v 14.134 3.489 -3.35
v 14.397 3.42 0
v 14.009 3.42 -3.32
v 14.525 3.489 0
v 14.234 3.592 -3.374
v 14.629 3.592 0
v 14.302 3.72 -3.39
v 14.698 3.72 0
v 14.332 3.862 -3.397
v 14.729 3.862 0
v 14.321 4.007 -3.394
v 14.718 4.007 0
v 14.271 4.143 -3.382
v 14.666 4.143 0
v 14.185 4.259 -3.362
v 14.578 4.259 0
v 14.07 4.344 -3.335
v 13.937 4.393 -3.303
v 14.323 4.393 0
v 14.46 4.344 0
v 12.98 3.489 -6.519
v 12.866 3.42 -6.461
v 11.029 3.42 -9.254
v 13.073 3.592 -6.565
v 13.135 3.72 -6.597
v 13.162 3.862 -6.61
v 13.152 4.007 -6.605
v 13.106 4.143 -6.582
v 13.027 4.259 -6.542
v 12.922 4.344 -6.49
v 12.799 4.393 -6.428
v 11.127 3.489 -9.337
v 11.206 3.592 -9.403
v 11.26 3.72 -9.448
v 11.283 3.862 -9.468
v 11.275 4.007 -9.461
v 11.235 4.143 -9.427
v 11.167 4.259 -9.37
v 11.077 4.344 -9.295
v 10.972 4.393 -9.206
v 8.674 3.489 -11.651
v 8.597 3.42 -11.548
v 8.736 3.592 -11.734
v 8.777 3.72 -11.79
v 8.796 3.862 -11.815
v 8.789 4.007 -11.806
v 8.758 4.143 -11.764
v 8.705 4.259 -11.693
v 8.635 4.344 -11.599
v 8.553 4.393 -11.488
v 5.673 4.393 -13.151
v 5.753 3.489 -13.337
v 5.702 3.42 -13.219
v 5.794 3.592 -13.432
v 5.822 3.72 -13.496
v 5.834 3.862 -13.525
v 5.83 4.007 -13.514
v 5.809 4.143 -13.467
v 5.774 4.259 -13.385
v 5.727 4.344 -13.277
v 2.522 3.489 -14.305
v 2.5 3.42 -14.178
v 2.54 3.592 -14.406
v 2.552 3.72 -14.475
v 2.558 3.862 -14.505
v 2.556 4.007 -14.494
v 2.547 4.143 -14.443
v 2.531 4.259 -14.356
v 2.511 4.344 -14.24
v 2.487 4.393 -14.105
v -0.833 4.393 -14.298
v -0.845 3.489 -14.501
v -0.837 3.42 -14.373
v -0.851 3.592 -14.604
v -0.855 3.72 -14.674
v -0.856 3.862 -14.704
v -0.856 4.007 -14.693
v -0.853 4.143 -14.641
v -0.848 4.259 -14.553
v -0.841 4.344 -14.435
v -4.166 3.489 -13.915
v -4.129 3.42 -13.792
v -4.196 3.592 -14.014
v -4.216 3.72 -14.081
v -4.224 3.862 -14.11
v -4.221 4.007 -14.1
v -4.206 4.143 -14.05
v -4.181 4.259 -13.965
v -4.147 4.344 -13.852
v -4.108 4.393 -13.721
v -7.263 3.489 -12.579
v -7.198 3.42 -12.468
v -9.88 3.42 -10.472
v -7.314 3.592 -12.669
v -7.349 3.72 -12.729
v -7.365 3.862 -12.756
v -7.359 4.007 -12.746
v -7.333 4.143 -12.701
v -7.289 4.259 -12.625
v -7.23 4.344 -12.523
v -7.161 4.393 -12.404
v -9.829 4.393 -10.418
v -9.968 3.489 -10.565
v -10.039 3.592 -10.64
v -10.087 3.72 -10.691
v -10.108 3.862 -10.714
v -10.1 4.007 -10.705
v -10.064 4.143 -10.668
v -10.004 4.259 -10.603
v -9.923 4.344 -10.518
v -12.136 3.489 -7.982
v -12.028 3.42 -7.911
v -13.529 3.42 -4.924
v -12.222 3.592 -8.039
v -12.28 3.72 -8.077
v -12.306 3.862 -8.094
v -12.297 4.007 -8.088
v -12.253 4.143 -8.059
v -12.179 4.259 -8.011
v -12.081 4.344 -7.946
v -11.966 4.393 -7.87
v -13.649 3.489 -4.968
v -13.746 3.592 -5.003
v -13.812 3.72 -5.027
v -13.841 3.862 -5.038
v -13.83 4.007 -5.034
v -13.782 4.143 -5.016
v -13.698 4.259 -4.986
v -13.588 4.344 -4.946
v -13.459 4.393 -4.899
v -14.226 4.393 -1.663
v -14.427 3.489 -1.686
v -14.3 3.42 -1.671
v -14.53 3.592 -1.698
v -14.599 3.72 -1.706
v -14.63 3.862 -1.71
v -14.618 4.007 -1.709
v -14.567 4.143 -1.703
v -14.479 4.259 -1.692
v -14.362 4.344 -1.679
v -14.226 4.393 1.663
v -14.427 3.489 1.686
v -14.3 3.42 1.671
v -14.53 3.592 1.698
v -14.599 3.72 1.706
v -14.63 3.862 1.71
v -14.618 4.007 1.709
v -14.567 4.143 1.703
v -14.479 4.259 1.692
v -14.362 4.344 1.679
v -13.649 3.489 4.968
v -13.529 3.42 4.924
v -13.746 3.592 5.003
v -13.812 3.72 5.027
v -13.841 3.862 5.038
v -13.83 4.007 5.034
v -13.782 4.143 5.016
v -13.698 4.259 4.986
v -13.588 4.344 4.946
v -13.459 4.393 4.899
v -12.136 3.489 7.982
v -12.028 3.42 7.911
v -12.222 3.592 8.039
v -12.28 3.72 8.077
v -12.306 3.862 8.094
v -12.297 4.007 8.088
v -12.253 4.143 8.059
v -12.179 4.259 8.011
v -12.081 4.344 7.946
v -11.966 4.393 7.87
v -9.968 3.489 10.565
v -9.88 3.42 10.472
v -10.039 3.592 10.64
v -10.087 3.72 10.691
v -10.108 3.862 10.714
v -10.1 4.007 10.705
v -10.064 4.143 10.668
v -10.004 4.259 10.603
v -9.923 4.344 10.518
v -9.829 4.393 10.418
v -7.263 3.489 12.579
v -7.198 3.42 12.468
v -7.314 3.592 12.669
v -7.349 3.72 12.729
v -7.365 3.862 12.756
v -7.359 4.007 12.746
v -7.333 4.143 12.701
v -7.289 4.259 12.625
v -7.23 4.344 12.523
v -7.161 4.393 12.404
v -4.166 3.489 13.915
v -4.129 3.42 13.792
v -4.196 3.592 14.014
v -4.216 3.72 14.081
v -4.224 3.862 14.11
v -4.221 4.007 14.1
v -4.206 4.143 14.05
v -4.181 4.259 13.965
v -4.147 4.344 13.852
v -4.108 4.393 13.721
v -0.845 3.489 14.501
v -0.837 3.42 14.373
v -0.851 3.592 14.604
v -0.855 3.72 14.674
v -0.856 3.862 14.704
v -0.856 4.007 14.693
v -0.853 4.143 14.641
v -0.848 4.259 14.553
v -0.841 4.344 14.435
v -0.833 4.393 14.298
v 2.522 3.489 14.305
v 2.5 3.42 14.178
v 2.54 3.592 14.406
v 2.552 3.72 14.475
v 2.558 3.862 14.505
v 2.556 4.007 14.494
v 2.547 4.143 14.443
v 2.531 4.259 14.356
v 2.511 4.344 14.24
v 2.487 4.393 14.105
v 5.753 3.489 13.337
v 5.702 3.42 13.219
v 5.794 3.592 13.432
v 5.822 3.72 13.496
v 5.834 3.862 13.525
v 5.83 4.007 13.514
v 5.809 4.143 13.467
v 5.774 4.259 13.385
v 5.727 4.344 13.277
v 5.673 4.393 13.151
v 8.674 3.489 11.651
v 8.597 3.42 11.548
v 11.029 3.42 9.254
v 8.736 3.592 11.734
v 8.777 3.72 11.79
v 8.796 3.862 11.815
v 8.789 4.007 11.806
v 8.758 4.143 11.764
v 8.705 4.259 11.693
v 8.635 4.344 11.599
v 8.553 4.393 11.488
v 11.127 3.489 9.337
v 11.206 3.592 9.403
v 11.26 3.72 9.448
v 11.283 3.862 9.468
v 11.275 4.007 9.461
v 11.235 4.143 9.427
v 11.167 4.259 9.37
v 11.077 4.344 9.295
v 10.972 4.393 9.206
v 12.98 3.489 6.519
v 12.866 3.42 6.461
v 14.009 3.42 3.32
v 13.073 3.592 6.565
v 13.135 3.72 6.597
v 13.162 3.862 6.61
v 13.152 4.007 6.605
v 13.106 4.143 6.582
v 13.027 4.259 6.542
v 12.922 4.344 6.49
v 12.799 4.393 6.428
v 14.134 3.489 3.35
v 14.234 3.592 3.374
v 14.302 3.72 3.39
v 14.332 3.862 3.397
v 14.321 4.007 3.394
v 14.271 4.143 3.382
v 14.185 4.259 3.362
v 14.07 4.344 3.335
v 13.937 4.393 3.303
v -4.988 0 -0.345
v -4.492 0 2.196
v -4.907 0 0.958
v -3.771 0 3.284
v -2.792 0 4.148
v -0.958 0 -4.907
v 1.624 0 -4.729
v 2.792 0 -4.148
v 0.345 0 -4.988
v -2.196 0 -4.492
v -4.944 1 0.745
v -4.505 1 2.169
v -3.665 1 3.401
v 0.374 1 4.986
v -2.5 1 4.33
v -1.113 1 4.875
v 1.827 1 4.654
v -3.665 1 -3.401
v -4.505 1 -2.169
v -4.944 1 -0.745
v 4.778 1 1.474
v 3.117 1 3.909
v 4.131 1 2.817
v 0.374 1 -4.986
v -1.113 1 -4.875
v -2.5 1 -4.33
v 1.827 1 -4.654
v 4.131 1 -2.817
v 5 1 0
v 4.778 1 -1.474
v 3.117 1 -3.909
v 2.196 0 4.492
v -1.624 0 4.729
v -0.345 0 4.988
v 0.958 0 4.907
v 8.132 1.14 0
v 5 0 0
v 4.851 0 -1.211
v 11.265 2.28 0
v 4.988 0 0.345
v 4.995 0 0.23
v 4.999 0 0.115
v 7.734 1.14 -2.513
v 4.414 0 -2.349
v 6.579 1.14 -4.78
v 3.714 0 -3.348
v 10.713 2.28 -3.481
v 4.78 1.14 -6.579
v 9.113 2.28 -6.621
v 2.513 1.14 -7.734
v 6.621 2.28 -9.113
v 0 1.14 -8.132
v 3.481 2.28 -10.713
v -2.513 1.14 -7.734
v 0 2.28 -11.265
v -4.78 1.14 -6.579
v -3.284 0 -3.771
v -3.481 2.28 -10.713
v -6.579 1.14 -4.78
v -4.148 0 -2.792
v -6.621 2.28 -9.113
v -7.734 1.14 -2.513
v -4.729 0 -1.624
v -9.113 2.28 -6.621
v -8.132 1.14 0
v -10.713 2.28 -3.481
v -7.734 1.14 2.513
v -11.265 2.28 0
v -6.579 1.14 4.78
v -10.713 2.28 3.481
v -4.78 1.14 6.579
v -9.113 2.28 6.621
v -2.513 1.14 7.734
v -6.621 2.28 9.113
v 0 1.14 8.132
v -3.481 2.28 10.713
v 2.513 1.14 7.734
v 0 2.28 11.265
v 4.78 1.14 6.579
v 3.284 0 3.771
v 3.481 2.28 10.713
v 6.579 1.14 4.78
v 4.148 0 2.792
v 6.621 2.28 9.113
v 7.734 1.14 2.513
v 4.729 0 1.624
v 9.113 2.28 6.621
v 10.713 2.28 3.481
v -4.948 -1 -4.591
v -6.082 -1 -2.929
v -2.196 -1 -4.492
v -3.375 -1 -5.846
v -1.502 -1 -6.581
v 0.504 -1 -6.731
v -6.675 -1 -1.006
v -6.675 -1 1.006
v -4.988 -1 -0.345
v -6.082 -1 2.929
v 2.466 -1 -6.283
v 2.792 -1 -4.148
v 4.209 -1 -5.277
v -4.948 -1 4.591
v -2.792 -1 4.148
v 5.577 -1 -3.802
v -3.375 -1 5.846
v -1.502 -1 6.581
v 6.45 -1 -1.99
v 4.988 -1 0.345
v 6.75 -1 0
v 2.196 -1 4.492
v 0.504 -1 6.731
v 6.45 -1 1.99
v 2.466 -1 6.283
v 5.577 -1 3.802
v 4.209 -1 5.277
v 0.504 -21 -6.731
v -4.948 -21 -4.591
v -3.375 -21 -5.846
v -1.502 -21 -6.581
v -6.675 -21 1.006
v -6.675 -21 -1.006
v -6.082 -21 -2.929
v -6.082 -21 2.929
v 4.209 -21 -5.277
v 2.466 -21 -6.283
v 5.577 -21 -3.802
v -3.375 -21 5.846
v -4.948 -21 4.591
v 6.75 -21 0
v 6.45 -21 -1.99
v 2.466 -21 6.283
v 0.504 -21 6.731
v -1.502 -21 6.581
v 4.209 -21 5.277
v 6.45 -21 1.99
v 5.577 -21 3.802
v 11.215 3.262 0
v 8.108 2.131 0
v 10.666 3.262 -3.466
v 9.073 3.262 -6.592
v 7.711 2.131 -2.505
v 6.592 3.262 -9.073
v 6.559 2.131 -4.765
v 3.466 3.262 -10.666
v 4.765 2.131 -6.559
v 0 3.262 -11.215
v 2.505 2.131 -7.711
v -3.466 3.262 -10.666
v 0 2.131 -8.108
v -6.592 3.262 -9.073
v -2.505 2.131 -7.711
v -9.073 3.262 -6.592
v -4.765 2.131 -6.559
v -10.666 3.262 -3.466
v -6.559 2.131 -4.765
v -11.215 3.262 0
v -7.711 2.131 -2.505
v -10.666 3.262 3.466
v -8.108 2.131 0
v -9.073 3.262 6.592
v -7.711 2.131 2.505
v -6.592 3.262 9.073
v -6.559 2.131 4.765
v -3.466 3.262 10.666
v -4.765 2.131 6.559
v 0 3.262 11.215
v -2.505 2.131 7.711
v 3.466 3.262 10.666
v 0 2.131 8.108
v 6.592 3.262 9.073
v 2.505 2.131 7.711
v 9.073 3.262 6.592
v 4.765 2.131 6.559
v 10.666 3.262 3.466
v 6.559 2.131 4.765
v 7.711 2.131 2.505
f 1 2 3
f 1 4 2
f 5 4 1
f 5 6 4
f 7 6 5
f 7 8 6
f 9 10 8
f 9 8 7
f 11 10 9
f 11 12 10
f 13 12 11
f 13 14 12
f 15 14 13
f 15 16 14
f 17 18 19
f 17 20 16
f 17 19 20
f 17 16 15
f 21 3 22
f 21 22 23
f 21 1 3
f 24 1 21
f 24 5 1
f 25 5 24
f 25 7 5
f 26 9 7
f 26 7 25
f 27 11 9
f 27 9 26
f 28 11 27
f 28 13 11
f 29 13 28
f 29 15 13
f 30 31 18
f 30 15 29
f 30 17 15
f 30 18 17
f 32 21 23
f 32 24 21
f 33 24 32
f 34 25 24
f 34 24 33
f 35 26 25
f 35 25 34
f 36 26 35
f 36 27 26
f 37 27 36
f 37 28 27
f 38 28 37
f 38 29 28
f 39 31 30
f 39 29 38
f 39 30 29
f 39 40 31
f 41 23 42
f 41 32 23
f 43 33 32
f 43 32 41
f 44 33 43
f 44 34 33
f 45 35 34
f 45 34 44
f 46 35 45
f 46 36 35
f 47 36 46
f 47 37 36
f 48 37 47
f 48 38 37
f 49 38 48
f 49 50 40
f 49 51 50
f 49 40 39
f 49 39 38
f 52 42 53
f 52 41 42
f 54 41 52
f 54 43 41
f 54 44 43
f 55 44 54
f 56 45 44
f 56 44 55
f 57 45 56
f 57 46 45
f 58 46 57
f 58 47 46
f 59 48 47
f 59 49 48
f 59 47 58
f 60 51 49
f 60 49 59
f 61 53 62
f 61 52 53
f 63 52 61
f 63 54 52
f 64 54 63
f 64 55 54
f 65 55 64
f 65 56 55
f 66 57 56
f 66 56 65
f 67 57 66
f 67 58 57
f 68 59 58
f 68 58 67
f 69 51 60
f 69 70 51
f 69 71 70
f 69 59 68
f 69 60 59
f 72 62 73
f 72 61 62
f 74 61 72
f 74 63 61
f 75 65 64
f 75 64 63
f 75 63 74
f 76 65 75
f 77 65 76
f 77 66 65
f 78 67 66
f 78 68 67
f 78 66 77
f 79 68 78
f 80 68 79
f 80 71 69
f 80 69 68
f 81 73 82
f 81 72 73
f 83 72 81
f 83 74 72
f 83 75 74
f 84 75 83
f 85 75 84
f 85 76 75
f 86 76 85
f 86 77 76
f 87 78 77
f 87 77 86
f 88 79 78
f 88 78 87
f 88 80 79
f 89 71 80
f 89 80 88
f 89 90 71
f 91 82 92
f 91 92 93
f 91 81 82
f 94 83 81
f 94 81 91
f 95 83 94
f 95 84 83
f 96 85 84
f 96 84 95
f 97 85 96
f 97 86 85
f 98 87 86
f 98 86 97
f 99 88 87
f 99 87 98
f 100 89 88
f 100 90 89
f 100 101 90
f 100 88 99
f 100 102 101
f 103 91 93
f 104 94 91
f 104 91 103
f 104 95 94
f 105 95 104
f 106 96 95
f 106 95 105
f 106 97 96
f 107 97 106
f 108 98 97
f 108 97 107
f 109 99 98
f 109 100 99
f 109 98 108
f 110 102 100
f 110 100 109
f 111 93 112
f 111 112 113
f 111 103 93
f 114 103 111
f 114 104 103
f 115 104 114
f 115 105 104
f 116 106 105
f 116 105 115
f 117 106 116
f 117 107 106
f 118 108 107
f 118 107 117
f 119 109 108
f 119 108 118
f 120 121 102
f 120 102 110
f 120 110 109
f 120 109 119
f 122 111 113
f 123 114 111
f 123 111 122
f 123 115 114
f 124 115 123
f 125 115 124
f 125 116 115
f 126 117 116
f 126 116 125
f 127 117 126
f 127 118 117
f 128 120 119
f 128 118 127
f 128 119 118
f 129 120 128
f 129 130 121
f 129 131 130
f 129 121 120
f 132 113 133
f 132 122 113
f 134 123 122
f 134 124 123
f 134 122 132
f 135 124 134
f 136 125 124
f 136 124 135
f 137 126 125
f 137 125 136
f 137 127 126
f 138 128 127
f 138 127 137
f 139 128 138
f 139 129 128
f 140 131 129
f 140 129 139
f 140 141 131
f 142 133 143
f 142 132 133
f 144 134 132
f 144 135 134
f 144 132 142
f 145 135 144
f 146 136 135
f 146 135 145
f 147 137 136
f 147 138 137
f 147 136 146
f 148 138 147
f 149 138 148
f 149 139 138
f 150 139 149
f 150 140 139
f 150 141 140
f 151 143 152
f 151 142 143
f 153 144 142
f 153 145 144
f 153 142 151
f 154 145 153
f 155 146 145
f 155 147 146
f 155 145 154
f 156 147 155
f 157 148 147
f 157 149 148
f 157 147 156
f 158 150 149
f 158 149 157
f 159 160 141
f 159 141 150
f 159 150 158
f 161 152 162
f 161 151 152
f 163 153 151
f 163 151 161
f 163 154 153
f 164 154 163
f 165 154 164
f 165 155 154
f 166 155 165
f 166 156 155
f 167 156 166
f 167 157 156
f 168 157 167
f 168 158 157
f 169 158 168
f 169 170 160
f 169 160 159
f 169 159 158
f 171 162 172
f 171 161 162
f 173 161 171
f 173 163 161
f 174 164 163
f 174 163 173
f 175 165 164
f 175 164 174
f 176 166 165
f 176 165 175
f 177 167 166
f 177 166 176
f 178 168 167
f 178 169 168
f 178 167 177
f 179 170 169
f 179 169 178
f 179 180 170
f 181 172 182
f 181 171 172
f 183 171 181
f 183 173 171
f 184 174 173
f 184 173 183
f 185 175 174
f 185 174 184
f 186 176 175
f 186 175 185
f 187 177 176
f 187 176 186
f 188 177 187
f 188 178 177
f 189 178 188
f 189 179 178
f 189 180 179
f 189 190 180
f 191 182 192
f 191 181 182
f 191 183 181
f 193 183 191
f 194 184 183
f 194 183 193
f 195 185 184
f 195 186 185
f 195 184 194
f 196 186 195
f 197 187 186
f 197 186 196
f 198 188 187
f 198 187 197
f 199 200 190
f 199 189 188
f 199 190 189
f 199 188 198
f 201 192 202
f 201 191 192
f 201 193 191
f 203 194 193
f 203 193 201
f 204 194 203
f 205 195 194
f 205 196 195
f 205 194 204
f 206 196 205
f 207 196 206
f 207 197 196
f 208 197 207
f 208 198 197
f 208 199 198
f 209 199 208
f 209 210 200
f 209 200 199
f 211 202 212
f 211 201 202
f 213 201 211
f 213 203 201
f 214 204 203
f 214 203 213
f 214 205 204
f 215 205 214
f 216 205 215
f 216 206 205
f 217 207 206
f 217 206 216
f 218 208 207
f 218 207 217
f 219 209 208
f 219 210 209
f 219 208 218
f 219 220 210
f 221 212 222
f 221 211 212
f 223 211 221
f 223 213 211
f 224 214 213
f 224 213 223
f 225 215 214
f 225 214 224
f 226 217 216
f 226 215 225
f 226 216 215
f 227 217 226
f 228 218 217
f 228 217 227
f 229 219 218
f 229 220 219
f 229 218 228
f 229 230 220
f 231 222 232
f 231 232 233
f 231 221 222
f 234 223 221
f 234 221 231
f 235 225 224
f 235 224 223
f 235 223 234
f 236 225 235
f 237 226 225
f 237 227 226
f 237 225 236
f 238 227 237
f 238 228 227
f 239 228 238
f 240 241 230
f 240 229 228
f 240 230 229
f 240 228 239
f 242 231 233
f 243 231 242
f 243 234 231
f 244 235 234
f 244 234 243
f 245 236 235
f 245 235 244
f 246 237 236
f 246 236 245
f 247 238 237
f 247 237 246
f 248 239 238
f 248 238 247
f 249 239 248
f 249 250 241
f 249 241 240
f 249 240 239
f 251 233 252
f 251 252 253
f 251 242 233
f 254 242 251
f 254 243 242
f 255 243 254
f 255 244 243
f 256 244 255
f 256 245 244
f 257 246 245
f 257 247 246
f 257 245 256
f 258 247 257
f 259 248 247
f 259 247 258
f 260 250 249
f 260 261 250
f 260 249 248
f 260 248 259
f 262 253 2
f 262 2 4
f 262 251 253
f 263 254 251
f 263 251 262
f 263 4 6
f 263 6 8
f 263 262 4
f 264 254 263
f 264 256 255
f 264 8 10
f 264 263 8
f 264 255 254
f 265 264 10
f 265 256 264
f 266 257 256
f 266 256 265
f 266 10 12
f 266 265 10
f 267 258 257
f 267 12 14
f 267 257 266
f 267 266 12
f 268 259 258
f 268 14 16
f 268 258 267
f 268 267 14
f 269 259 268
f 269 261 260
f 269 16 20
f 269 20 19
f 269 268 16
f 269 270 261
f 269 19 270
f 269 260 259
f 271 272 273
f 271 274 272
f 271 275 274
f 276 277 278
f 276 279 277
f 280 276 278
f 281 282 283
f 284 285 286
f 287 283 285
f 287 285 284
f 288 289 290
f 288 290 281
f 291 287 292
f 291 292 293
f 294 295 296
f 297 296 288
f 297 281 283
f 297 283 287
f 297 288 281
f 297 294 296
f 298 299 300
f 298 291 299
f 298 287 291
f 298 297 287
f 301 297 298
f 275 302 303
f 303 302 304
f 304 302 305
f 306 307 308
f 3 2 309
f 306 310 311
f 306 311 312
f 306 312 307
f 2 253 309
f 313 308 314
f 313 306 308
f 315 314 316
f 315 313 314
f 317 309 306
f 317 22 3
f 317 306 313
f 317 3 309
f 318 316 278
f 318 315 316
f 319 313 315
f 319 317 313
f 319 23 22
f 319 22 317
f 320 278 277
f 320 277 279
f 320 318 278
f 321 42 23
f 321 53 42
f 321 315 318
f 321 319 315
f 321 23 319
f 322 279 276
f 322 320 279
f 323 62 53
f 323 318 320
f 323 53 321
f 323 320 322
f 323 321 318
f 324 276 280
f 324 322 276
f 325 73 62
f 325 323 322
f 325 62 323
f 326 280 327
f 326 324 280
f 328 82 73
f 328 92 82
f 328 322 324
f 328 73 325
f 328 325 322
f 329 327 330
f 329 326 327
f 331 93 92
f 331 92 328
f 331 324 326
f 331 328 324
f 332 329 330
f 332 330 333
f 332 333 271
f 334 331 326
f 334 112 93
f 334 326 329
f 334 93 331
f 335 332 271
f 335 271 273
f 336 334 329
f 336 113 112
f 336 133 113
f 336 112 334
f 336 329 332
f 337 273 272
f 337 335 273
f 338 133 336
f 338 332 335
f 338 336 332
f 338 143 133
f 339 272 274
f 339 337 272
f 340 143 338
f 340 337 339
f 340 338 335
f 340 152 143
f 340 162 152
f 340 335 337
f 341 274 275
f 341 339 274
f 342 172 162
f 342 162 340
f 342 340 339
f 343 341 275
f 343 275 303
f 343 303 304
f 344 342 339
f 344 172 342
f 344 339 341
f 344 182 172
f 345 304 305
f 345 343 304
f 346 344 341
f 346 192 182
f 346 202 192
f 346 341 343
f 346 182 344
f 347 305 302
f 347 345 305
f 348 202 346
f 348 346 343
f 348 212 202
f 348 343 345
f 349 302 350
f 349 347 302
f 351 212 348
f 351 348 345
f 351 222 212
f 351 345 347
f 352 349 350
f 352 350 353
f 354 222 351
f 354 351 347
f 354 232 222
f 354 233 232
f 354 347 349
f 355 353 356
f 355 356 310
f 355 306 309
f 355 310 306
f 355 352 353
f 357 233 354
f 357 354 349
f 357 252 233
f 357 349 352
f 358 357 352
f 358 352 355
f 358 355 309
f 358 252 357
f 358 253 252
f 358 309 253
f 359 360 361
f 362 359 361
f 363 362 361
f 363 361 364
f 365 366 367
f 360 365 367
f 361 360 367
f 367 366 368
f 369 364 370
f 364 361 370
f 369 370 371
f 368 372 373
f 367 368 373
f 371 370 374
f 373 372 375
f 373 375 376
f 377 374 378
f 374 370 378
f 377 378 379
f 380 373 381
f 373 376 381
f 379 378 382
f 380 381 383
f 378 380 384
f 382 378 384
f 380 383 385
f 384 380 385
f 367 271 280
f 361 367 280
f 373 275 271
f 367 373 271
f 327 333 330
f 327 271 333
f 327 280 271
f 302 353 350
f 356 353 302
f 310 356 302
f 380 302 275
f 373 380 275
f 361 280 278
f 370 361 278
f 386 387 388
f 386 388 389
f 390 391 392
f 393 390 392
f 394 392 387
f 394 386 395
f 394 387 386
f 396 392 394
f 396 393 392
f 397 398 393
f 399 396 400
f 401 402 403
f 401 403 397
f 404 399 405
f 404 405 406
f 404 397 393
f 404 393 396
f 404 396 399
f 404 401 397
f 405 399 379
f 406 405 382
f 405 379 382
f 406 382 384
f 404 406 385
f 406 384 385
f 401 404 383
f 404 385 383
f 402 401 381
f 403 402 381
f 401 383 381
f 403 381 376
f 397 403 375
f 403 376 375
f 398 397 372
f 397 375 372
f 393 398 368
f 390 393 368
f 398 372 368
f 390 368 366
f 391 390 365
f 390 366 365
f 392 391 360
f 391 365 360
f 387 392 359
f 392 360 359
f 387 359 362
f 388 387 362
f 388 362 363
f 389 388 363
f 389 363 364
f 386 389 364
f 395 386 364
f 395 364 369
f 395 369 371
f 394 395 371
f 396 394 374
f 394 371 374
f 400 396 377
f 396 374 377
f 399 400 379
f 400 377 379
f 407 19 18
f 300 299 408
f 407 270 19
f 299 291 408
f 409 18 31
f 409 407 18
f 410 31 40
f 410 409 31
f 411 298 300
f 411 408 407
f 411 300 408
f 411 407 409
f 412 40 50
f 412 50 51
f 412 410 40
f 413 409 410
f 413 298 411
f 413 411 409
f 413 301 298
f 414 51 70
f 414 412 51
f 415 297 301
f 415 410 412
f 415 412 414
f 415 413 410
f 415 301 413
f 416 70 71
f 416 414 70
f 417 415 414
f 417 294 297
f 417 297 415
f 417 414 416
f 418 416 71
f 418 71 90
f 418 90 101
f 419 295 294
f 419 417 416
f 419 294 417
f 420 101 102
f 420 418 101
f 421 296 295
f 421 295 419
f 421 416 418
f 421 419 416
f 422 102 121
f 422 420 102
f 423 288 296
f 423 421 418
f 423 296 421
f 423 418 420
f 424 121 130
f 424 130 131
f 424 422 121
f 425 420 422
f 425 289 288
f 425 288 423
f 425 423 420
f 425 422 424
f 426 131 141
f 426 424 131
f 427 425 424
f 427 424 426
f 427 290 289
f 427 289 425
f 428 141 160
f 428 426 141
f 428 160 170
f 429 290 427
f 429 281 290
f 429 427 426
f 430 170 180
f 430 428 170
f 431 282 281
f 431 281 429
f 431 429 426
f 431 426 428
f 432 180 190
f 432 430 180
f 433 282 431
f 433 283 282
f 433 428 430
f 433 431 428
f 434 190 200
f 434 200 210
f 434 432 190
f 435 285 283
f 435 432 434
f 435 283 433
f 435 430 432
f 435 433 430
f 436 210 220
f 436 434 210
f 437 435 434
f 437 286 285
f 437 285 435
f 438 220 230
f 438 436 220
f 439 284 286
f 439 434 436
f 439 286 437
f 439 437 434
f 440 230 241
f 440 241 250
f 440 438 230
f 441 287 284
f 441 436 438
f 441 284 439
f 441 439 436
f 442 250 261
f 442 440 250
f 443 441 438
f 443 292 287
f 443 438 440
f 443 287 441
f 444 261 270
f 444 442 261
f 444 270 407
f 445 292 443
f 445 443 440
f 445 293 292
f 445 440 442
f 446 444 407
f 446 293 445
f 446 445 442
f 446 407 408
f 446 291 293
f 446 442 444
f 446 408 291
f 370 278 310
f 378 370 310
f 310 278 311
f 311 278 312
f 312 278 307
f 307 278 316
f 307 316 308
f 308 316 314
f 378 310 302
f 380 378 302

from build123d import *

# Parameters (mm, degrees)
BOSS_EXTRU_1_DEPTH  = 1
SKETCH1_R           = 6.75
BOSS_EXTRUDE1_DEPTH = 20


with BuildPart() as part:
    # Esquisse1 → Révolution1 (revolve)
    with BuildSketch(Plane.XY):
        with BuildLine():
            Line((0, 0), (5, 0))
            Line((5, 0), (14.396926208, 3.420201433))
            ThreePointArc((14.396926208, 3.420201433), (14.728803197, 3.934870166), (14.322587886, 4.393144497))
            Line((14.322587886, 4.393144497), (5, 1))
            Line((5, 1), (0, 1))
            Line((0, 1), (0, 0))
        make_face()
    revolve(axis=Axis((0, 0, 0), (0, 1, 0)))

    # Esquisse2 → Boss.-Extru.1 (add)
    with BuildSketch(Plane.XZ):
        Polygon((2.792425312, -4.14757289), (4.988116143, 0.344524813), (2.195690831, 4.492097703), (-2.792425312, 4.14757289), (-4.988116143, -0.344524813), (-2.195690831, -4.492097703), align=None)
    extrude(amount=BOSS_EXTRU_1_DEPTH)

    # Sketch1 → Boss-Extrude1 (add)
    with BuildSketch(Plane.XZ.offset(1)):
        Circle(SKETCH1_R)
    extrude(amount=BOSS_EXTRUDE1_DEPTH)


solid = part.part
